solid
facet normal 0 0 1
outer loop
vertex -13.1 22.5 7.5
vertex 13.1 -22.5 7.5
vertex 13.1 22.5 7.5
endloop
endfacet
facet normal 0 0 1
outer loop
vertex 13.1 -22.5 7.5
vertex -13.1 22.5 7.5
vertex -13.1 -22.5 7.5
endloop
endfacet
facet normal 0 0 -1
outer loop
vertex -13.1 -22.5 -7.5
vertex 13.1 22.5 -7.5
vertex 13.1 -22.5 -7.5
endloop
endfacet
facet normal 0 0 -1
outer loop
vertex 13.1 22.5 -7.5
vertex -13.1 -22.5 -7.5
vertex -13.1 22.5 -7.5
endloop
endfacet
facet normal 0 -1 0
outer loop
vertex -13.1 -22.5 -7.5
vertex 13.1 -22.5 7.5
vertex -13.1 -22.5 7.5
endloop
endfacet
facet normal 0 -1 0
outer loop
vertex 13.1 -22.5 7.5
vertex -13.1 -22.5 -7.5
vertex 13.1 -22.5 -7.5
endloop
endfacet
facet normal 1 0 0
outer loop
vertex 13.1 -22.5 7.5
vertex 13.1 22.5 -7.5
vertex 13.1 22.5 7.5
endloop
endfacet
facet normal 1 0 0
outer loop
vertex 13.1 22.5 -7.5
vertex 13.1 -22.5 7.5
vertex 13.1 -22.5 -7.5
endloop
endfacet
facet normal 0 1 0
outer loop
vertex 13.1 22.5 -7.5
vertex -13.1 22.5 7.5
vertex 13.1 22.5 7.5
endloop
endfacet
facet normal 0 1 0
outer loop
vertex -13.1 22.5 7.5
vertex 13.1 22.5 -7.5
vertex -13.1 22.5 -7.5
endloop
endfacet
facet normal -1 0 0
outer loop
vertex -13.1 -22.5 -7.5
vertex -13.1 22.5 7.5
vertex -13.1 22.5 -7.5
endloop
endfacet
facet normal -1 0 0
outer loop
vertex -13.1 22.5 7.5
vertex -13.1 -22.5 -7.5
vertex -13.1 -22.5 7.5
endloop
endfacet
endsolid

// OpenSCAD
module 9V_battery()
{
	9V_width=26.2;
	9V_length=45;
	9V_thickness= 15;
	cube(size=[9V_width,9V_length,9V_thickness], center=true);
}

9V_battery();
